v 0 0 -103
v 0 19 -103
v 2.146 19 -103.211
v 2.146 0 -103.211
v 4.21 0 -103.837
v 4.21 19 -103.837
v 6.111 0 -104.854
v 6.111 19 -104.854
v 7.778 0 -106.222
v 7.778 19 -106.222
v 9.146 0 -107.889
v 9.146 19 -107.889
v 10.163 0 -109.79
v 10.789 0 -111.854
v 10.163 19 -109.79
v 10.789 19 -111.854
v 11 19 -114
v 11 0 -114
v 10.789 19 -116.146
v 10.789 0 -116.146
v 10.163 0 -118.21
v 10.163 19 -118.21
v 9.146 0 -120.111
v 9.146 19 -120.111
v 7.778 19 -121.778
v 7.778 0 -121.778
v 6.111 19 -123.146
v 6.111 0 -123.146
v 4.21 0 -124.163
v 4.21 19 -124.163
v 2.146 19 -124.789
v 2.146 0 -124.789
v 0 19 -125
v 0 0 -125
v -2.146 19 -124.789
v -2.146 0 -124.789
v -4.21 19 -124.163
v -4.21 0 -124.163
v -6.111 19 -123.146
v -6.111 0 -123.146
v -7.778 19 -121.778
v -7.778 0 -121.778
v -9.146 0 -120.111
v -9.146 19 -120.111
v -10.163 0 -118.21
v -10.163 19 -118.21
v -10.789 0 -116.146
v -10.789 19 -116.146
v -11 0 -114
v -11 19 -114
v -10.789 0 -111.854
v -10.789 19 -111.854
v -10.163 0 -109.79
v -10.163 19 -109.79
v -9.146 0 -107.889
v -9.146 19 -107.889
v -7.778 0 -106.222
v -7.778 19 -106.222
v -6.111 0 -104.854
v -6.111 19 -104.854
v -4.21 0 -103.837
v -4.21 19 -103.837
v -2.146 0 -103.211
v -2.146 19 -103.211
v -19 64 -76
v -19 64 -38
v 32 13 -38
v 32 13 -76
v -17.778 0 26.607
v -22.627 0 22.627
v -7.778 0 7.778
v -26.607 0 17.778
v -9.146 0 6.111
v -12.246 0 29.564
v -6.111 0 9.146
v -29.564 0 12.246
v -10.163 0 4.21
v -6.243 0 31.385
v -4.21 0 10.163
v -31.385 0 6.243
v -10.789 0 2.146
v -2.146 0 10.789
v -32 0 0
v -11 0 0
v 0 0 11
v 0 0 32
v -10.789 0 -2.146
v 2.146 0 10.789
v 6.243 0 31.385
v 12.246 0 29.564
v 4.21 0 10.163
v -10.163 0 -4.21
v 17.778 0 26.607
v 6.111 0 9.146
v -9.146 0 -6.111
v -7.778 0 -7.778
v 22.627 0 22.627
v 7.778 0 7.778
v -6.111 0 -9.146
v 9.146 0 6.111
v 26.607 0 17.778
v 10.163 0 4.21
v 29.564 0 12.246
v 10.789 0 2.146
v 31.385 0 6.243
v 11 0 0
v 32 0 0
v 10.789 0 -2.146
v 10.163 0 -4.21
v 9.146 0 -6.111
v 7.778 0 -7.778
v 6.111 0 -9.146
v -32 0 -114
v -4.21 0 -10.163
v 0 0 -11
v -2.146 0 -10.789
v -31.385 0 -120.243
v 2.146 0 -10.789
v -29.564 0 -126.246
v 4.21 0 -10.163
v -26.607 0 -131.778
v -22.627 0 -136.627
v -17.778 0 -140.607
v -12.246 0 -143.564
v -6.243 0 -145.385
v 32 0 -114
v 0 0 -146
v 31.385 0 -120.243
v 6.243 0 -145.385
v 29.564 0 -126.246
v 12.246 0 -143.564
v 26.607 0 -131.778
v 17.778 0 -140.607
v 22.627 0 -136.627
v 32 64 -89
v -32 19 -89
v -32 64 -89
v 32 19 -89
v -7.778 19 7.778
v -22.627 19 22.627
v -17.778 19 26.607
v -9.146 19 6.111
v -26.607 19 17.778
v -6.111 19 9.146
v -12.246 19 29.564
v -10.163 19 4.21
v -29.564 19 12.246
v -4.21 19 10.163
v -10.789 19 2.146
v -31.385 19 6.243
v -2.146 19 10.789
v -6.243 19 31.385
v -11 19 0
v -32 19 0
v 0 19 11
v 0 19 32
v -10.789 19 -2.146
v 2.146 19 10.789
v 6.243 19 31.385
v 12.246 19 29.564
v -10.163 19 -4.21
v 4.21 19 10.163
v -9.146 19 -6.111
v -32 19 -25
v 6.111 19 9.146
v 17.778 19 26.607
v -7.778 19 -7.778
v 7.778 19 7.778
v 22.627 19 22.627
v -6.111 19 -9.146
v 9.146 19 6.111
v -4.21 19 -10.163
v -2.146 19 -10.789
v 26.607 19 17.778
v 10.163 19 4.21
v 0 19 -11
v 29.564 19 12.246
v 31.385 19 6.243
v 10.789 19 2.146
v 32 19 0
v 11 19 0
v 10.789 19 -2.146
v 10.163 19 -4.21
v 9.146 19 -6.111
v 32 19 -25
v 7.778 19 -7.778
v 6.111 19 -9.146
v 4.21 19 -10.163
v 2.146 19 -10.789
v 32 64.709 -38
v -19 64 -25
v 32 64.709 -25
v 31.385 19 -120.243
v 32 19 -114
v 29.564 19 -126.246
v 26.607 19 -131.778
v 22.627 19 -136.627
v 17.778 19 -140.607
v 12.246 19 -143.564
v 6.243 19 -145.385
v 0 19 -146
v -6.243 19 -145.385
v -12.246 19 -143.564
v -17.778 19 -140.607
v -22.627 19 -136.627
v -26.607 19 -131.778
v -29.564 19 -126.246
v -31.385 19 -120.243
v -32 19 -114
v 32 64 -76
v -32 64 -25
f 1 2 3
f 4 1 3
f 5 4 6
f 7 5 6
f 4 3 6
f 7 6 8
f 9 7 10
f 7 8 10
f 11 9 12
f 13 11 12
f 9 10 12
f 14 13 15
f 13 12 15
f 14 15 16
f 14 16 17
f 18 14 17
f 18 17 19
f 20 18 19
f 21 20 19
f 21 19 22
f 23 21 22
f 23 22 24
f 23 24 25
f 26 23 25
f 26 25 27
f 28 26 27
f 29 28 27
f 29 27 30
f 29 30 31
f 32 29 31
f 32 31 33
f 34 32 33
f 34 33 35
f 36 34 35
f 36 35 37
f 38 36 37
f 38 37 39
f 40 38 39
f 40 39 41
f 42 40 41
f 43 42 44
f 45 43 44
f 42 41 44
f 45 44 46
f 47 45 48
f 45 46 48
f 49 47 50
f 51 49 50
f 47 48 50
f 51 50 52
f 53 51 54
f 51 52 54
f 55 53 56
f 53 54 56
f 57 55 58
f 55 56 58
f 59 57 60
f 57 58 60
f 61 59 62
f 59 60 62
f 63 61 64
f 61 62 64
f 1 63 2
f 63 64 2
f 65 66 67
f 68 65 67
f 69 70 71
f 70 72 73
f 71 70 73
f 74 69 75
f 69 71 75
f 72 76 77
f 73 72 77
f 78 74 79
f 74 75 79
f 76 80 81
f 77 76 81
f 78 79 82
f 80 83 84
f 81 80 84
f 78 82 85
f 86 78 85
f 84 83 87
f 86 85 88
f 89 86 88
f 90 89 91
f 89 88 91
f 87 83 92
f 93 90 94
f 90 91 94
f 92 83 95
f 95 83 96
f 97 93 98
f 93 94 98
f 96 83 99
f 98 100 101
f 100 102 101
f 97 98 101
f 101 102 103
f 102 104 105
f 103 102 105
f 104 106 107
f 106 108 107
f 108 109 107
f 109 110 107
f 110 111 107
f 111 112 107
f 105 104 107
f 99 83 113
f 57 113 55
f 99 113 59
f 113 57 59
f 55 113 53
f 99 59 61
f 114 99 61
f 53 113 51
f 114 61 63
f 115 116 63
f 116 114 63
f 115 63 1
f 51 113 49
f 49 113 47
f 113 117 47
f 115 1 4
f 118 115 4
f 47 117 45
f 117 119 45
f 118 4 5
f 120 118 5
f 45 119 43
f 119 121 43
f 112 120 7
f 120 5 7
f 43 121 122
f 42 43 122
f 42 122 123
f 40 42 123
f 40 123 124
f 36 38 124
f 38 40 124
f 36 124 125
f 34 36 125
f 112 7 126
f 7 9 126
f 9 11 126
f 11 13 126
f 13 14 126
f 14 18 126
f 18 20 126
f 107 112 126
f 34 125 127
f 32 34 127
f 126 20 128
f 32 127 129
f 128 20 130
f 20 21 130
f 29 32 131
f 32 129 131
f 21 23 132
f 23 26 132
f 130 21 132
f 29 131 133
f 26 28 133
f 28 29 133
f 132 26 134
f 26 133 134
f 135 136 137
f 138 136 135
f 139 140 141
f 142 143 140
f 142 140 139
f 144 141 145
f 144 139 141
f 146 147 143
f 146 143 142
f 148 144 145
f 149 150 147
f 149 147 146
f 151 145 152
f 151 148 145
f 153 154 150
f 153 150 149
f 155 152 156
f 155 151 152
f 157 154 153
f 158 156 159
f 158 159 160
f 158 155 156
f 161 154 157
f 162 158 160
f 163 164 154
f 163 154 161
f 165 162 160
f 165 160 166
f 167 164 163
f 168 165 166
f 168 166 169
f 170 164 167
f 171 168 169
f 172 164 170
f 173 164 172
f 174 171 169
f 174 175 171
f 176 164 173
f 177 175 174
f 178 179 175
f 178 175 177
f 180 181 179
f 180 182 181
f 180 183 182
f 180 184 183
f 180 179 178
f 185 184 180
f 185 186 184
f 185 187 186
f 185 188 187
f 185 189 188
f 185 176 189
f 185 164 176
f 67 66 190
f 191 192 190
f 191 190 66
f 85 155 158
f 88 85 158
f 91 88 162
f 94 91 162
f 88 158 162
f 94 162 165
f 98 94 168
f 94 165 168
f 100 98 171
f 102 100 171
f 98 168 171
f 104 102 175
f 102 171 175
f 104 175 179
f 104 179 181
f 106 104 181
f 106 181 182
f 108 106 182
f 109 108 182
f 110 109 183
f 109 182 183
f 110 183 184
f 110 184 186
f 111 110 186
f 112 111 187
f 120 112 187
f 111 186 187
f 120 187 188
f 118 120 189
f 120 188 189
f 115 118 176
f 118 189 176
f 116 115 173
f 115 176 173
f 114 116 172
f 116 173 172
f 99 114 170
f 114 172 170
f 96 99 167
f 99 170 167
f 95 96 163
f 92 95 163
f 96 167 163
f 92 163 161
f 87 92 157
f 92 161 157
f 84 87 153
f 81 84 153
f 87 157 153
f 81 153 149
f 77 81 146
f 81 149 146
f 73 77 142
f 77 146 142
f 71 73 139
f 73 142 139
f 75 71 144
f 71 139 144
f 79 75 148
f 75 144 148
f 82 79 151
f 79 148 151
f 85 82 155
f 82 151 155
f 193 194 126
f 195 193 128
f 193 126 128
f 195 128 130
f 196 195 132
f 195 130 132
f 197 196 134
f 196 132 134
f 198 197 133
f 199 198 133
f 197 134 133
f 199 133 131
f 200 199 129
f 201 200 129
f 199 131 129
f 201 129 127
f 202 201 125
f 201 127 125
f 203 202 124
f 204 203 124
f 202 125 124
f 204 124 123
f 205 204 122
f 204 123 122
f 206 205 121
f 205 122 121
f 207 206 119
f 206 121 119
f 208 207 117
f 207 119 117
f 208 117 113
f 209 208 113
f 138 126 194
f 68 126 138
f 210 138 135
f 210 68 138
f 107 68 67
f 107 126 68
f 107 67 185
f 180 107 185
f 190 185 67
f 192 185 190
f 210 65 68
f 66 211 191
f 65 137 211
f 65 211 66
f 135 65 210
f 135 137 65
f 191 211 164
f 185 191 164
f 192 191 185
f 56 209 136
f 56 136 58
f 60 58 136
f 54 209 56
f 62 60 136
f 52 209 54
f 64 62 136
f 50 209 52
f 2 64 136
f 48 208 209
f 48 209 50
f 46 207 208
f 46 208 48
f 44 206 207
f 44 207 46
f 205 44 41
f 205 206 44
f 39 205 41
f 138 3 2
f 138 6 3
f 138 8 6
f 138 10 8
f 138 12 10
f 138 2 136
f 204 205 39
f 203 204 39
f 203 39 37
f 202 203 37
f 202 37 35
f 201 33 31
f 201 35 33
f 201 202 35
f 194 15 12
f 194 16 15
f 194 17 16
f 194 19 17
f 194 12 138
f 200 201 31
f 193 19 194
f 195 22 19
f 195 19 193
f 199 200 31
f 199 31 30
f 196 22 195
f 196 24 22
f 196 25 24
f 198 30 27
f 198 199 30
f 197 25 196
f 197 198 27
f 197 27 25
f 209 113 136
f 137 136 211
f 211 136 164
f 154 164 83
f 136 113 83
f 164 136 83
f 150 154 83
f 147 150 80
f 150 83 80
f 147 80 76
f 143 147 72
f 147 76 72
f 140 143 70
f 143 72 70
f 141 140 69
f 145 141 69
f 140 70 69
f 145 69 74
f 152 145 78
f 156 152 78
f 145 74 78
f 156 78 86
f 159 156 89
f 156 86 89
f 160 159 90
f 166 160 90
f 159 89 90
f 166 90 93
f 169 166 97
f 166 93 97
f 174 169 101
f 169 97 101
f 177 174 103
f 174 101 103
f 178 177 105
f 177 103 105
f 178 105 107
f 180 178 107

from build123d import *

# Parameters (mm, degrees)
BOSS_EXTRUDE1_DEPTH = 19
SKETCH2_R           = 11
CUT_EXTRUDE1_DEPTH  = 19
SKETCH3_R           = 11
CUT_EXTRUDE3_DEPTH  = 422
SKETCH4_W           = 64
SKETCH4_H           = 64
BOSS_EXTRUDE2_DEPTH = 45
CUT_EXTRUDE4_DEPTH  = 51
BOSS_EXTRUDE3_DEPTH = 13


with BuildPart() as part:
    # Sketch1 → Boss-Extrude1 (new body)
    with BuildSketch(Plane(origin=(0, 0, 0), x_dir=(1, 0, 0), z_dir=(0, 1, 0))):
        with BuildLine():
            Line((-32, 114), (-32, 0))
            ThreePointArc((-32, 0), (0, -32), (32, 0))
            Line((32, 0), (32, 114))
            ThreePointArc((32, 114), (0, 146), (-32, 114))
        make_face()
    extrude(amount=BOSS_EXTRUDE1_DEPTH)

    # Sketch2 → Cut-Extrude1 (cut)
    with BuildSketch(Plane(origin=(0, 19, 0), x_dir=(1, 0, 0), z_dir=(0, 1, 0))):
        with Locations(Location((0, 0, 0), (0, 0, 270))):
            Circle(SKETCH2_R)
    extrude(amount=-CUT_EXTRUDE1_DEPTH, mode=Mode.SUBTRACT)

    # Sketch3 → Cut-Extrude3 (cut)
    with BuildSketch(Plane(origin=(0, 19, 0), x_dir=(1, 0, 0), z_dir=(0, 1, 0))):
        with Locations(Location((0, 114, 0), (0, 0, 270))):
            Circle(SKETCH3_R)
    extrude(amount=-CUT_EXTRUDE3_DEPTH, mode=Mode.SUBTRACT)

    # Sketch4 → Boss-Extrude2 (add)
    with BuildSketch(Plane(origin=(0, 19, 0), x_dir=(1, 0, 0), z_dir=(0, 1, 0))):
        with Locations((0, 57)):
            Rectangle(SKETCH4_W, SKETCH4_H)
    extrude(amount=BOSS_EXTRUDE2_DEPTH)

    # Sketch5 → Cut-Extrude4 (cut)
    with BuildSketch(Plane.XY.offset(-25)):
        Polygon((32, 64), (-19, 64), (32, 13), align=None)
    extrude(amount=-CUT_EXTRUDE4_DEPTH, mode=Mode.SUBTRACT)

    # Sketch6 → Boss-Extrude3 (add)
    with BuildSketch(Plane.XY.offset(-25)):
        Polygon((32, 13), (32, 64.70943725), (-19, 64), align=None)
    extrude(amount=-BOSS_EXTRUDE3_DEPTH)


solid = part.part
